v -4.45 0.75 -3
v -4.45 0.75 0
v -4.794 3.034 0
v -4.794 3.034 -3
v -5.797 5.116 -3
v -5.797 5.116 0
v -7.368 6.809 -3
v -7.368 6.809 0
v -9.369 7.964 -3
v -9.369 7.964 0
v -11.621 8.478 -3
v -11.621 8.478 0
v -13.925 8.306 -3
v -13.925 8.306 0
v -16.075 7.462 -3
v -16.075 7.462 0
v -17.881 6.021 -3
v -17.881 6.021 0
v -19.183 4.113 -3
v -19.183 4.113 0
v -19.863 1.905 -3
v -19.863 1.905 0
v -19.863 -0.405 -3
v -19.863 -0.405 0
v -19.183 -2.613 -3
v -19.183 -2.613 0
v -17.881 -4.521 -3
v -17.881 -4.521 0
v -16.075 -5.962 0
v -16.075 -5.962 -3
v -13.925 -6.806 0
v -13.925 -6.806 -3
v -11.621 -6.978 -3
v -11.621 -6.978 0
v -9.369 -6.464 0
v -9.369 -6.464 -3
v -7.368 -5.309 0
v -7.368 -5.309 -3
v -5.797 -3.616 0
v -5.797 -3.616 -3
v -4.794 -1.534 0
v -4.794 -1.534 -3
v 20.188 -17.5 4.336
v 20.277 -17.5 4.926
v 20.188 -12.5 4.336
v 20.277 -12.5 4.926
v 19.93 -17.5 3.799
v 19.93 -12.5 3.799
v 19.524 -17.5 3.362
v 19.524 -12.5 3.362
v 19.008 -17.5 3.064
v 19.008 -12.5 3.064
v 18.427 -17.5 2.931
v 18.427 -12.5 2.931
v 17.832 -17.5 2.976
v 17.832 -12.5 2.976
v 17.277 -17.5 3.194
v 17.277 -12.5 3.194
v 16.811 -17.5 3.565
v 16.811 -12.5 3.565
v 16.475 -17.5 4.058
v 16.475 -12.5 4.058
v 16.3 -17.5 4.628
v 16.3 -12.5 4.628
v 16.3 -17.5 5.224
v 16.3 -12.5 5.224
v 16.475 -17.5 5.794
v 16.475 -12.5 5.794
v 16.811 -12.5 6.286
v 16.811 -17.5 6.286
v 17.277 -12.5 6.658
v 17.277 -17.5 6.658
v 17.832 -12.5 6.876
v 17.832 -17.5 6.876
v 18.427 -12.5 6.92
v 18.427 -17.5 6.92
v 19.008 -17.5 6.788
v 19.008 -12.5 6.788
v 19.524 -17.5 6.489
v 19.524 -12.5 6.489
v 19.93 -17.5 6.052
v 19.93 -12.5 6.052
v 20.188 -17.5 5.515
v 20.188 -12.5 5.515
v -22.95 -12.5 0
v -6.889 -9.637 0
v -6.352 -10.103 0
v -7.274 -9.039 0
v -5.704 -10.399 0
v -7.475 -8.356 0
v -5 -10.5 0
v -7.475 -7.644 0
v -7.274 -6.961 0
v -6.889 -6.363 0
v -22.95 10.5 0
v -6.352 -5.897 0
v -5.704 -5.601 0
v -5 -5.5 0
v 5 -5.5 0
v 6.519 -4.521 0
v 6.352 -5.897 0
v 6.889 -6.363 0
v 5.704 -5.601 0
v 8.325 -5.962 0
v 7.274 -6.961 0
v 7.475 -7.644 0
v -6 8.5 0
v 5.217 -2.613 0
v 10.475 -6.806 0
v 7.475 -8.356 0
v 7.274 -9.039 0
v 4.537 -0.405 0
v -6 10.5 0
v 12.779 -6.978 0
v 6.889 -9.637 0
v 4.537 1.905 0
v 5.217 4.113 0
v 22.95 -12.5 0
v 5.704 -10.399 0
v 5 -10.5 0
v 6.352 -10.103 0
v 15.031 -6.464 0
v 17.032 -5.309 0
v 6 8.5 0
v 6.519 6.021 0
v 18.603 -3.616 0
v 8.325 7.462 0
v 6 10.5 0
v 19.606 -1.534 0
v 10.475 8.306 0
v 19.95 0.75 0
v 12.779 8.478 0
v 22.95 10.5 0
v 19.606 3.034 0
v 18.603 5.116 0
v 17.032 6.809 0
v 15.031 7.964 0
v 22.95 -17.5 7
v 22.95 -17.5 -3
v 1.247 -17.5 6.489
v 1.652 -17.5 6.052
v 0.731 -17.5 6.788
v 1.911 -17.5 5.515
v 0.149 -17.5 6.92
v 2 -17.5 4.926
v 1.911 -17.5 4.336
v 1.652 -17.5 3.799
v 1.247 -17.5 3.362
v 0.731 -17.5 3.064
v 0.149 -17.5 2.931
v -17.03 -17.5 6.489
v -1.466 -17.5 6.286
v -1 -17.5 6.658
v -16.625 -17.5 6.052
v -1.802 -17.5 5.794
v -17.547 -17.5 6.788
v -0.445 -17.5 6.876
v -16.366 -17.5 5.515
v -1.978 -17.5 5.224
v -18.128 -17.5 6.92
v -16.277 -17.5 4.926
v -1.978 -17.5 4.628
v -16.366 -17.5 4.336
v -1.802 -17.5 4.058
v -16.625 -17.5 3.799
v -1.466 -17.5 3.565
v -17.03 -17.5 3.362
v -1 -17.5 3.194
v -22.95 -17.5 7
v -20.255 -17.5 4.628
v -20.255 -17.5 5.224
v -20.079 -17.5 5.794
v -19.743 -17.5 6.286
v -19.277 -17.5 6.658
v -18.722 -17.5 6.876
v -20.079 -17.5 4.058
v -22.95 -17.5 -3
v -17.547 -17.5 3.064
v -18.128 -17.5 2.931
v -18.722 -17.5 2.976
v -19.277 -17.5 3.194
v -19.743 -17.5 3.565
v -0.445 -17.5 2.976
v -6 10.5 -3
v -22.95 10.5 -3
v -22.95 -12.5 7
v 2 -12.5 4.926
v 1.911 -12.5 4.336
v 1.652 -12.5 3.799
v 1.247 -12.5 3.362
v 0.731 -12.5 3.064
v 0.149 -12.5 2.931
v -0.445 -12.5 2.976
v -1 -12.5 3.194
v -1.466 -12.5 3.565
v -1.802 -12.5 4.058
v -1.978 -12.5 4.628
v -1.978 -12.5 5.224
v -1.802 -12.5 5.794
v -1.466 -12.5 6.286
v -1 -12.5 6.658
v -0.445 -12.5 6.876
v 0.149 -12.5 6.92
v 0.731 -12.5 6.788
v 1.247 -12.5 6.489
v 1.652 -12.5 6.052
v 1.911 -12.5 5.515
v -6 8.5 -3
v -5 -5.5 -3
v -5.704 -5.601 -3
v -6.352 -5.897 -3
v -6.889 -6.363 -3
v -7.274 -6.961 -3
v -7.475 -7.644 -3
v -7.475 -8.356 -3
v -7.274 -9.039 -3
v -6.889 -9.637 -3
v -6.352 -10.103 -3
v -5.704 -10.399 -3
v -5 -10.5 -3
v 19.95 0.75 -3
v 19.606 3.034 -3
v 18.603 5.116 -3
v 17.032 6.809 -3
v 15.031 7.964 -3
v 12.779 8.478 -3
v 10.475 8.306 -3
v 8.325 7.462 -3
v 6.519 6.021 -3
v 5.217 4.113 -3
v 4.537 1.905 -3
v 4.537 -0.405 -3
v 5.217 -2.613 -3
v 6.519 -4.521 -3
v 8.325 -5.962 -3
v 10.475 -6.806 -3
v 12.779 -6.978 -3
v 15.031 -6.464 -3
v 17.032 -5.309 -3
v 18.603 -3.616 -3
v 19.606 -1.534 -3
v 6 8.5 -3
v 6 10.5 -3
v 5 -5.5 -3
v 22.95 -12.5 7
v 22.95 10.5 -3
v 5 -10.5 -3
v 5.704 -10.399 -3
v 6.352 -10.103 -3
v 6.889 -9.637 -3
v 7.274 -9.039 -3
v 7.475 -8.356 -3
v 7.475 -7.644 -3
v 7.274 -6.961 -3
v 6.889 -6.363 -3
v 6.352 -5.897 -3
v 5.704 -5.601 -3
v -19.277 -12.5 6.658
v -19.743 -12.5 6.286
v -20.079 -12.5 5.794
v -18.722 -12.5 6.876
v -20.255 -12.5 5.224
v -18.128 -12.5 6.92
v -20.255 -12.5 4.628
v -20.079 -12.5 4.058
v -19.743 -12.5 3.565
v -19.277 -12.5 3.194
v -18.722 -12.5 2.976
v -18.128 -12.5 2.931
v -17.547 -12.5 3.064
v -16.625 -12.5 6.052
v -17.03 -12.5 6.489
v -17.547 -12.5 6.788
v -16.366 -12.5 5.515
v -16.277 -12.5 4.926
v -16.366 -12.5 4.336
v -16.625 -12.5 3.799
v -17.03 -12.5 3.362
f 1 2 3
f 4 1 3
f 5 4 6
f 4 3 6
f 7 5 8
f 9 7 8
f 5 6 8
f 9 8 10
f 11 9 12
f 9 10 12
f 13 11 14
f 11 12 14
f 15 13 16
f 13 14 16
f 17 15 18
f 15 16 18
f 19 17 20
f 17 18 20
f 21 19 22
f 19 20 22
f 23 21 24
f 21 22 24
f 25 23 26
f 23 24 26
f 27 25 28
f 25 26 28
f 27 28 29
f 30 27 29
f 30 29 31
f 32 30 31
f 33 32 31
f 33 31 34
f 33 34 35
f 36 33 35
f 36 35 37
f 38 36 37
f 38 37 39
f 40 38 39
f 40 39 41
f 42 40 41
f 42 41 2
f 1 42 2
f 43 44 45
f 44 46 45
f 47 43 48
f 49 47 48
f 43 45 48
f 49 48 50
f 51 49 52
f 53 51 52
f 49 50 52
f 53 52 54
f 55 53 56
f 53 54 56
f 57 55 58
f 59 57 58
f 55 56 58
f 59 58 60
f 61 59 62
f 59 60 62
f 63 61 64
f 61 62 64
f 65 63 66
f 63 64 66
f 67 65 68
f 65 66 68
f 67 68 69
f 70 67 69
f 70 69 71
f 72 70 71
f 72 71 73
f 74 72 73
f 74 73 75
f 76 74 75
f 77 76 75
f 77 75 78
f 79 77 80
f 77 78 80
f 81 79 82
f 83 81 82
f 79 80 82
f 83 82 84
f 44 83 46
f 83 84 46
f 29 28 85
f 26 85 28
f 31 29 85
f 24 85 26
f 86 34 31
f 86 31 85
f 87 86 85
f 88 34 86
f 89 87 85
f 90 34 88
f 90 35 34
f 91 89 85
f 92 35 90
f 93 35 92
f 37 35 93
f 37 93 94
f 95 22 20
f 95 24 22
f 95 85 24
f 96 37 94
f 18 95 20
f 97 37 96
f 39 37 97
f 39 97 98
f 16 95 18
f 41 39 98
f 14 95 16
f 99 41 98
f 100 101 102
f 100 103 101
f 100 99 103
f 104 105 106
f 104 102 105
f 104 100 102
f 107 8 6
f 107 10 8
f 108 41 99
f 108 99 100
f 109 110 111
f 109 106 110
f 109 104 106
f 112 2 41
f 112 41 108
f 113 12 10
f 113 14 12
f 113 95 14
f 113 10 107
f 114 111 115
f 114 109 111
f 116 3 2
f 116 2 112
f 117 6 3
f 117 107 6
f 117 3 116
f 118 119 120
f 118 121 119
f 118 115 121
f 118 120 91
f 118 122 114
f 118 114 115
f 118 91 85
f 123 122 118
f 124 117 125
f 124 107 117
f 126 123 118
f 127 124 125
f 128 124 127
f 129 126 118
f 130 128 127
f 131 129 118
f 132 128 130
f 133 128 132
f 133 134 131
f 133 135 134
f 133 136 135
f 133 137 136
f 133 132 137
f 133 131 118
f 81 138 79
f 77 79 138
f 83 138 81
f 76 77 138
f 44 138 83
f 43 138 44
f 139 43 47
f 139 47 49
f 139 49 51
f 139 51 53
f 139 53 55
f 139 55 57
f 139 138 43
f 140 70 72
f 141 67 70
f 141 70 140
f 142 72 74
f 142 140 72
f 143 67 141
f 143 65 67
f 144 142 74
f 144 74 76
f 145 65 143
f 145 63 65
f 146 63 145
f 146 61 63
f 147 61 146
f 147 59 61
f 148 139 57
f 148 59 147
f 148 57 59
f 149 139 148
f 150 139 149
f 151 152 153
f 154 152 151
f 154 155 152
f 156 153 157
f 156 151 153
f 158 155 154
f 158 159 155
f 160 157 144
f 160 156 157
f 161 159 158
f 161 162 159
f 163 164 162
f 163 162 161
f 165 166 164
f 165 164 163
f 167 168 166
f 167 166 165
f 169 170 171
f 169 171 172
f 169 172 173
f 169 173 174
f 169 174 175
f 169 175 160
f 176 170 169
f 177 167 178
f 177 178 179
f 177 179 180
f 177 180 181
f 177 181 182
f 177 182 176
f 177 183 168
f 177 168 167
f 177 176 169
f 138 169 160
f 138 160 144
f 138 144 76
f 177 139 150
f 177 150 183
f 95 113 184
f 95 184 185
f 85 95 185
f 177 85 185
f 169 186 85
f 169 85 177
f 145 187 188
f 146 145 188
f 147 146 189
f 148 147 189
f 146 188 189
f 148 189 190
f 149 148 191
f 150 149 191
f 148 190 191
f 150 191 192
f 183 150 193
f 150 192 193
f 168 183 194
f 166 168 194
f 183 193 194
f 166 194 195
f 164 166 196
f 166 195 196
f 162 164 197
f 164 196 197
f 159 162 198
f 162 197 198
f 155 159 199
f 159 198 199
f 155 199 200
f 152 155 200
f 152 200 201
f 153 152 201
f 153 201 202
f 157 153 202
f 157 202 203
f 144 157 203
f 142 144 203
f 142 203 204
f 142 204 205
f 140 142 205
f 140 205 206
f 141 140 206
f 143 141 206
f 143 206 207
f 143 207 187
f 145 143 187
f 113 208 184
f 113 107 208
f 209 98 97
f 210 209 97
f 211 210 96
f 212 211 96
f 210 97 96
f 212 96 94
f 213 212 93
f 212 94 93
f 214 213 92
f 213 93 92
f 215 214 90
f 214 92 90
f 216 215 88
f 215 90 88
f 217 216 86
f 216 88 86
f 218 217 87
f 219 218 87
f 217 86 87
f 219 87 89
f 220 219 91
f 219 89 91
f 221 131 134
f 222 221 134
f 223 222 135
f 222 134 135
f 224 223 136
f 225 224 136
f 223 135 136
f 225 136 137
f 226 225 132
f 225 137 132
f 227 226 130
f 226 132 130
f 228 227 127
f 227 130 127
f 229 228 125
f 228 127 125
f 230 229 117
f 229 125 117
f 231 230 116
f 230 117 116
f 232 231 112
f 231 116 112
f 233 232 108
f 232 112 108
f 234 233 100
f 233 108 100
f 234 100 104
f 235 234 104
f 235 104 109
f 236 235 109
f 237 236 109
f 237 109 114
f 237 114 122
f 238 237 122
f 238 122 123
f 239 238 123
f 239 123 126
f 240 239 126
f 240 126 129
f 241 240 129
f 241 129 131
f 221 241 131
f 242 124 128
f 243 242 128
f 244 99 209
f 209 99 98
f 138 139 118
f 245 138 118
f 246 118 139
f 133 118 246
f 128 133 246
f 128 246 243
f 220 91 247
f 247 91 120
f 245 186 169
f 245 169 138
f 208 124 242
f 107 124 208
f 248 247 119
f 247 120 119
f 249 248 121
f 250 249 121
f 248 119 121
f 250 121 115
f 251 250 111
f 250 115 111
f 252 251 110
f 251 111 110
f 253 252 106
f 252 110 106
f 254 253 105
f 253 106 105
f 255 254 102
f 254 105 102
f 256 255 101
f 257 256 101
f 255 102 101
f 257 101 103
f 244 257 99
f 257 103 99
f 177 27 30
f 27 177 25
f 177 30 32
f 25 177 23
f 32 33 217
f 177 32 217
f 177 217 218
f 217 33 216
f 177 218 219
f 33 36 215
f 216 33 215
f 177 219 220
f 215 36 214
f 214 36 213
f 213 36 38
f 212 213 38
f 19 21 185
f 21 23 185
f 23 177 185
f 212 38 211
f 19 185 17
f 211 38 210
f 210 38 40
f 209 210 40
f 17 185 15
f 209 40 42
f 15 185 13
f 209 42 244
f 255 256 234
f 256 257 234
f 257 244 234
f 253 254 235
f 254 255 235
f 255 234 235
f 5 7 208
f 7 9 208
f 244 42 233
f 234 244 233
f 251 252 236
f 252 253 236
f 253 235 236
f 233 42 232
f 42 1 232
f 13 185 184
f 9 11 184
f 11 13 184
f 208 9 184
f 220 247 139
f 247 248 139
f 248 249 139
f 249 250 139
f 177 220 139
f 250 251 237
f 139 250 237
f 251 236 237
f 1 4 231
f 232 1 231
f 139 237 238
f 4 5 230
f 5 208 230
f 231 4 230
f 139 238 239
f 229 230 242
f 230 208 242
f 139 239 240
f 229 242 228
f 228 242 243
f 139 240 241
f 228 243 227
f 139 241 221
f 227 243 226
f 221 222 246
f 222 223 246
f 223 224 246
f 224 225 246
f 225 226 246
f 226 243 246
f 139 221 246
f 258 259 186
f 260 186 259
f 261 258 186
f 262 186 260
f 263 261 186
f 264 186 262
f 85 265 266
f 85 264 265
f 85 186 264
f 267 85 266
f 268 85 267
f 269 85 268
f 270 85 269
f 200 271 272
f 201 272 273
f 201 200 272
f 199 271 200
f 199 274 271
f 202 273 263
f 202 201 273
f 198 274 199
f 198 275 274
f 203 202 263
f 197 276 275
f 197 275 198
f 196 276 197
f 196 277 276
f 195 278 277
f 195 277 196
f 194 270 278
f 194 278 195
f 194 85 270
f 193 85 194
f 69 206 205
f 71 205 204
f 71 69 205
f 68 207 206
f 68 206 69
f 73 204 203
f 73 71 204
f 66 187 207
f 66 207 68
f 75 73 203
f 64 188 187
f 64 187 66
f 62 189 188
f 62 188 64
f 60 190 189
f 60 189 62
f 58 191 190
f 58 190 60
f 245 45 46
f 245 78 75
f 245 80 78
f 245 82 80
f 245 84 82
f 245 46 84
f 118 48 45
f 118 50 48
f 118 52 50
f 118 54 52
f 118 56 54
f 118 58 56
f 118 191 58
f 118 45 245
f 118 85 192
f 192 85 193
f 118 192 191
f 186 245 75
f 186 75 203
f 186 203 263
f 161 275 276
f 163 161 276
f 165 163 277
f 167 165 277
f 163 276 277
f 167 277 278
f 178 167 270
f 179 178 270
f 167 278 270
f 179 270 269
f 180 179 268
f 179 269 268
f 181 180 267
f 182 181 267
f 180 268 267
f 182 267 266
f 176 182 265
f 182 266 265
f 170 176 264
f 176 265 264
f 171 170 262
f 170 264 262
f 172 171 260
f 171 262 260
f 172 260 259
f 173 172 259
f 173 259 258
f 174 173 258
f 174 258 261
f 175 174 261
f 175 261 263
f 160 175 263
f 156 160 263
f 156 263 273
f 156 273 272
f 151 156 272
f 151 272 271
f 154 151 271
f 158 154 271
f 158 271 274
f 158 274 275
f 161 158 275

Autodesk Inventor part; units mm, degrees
ref_plane "YZ Plane" through (0, 0, 0) normal (1, 0, 0) x (0, 1, 0)
ref_plane "XZ Plane" through (0, 0, 0) normal (0, 1, 0) x (-1, 0, 0)
ref_plane "XY Plane" through (0, 0, 0) normal (0, 0, 1) x (1, 0, 0)
sketch "Эскиз3" plane through (0, 0, 0) normal (0, 0, 1) x (1, 0, 0)
  line L0 (22.95, -10.5) -> (22.95, 10.5)
  line L1 (-22.95, 10.5) -> (-22.95, -10.5)
  line L2 (-22.95, -10.5) -> (22.95, 10.5) construction
  line L3 (22.95, -10.5) -> (-22.95, 10.5) construction
  line L4 (-6, 10.5) -> (-22.95, 10.5) construction
  line L5 (6, 10.5) -> (22.95, 10.5) construction
  line L6 (22.95, 0) -> (19.95, 0) construction
  line L7 (16.3868, 10.5) -> (16.3868, 8.5) construction
  line L8 (17.599, 8.5) -> (14.8742, 8.5) construction
  line L9 (19.95, 1.7069) -> (19.95, -1.7382) construction
  line L10 (16.2366, -10.5) -> (16.2366, -7) construction
  line L11 (17.599, -7) -> (14.2766, -7) construction
  circle A0 centre (12.2, 0.75) radius 7.75
  line L12 (0, 10.5) -> (0, -10.5) construction
  line L13 (-22.95, 0) -> (-19.95, 0) construction
  line L14 (-16.3868, 10.5) -> (-16.3868, 8.5) construction
  line L15 (-17.599, 8.5) -> (-14.8742, 8.5) construction
  line L16 (-19.95, 1.7069) -> (-19.95, -1.7382) construction
  line L17 (-16.2366, -10.5) -> (-16.2366, -7) construction
  line L18 (-17.599, -7) -> (-14.2766, -7) construction
  circle A1 centre (-12.2, 0.75) radius 7.75
  line L19 (-22.95, 0) -> (22.95, 0) construction
  line L20 (0, 8.5) -> (0, -5.5) construction
  line L21 (0, -5.5) -> (5, -5.5)
  line L22 (0, -5.5) -> (-5, -5.5)
  line L23 (-5, -10.5) -> (5, -10.5)
  arc A2 (-5, -5.5) -> (-5, -10.5) centre (-5, -8) ccw
  arc A3 (5, -10.5) -> (5, -5.5) centre (5, -8) ccw
  line L24 (-22.95, -10.5) -> (-22.95, -12.5)
  line L25 (-22.95, -12.5) -> (22.95, -12.5)
  line L26 (22.95, -12.5) -> (22.95, -10.5)
  line L27 (0, 8.5) -> (6, 8.5)
  line L28 (0, 8.5) -> (-6, 8.5)
  line L29 (-6, 8.5) -> (-6, 10.5)
  line L30 (6, 8.5) -> (6, 10.5)
  line L31 (22.95, 10.5) -> (6, 10.5)
  line L32 (-6, 10.5) -> (-22.95, 10.5)
  point P0 (0, 0)
  point P1 (5, -5.5)
  point P2 (-5, -5.5)
  dimension "d23" = 45.9
  dimension "d24" = 21
  dimension "d26" = 3
  dimension "d27" = 2
  dimension "d29" = 3.5
  dimension "d30" = 16
  dimension "d31" = 5
  dimension "d32" = 2.5
  dimension "d35" = 2
  dimension "d47" = 6
  dimension "d48" = 6
extrude "Выдавливание5" add sketch "Эскиз3" against normal blind 3
sketch "Эскиз4" plane through (0, 0, 0) normal (0, 0, 1) x (1, 0, 0)
  line L0 (-22.95, -12.5) -> (22.95, -12.5)
  line L1 (22.95, -12.5) -> (22.95, -17.5)
  line L2 (22.95, -17.5) -> (-22.95, -17.5)
  line L3 (-22.95, -17.5) -> (-22.95, -12.5)
  line L4 (22.95, -12.5) -> (-22.95, -12.5) projected
  point P0 (0, 0)
  dimension "d36" = 5
extrude "Выдавливание6" add sketch "Эскиз4" along normal blind 7 and the other way blind 3
sketch "Эскиз6" plane through (-22.95, -12.5, 0) normal (0, 1, 0) x (1, 0, 0)
  line L0 (45.9, 0) -> (0, 0) projected
  line L1 (0, -7) -> (0, 0) projected
  line L2 (45.9, -7) -> (0, -7) projected
  line L3 (45.9, 0) -> (45.9, -7) projected
  line L4 (45.9, 0) -> (45.9, -7) construction
  line L5 (45.9, -3.5) -> (0, -3.5) construction
  line L6 (0, -7) -> (0, 0) construction
  line L7 (0, -7) -> (45.9, -7) construction
  line L8 (22.95, -7) -> (22.95, 0) construction
  circle A0 centre (41.2273, -4.9258) radius 2
  circle A1 centre (4.6727, -4.9258) radius 2
  line L9 (45.9, -4.1809) -> (0, -4.1809) construction
  circle A2 centre (22.95, -4.9258) radius 2
  dimension "d50" = 4
extrude "Выдавливание8" cut sketch "Эскиз6" against normal blind 10 contours A0 | A1 | A2
properties part number "Mount for US"
